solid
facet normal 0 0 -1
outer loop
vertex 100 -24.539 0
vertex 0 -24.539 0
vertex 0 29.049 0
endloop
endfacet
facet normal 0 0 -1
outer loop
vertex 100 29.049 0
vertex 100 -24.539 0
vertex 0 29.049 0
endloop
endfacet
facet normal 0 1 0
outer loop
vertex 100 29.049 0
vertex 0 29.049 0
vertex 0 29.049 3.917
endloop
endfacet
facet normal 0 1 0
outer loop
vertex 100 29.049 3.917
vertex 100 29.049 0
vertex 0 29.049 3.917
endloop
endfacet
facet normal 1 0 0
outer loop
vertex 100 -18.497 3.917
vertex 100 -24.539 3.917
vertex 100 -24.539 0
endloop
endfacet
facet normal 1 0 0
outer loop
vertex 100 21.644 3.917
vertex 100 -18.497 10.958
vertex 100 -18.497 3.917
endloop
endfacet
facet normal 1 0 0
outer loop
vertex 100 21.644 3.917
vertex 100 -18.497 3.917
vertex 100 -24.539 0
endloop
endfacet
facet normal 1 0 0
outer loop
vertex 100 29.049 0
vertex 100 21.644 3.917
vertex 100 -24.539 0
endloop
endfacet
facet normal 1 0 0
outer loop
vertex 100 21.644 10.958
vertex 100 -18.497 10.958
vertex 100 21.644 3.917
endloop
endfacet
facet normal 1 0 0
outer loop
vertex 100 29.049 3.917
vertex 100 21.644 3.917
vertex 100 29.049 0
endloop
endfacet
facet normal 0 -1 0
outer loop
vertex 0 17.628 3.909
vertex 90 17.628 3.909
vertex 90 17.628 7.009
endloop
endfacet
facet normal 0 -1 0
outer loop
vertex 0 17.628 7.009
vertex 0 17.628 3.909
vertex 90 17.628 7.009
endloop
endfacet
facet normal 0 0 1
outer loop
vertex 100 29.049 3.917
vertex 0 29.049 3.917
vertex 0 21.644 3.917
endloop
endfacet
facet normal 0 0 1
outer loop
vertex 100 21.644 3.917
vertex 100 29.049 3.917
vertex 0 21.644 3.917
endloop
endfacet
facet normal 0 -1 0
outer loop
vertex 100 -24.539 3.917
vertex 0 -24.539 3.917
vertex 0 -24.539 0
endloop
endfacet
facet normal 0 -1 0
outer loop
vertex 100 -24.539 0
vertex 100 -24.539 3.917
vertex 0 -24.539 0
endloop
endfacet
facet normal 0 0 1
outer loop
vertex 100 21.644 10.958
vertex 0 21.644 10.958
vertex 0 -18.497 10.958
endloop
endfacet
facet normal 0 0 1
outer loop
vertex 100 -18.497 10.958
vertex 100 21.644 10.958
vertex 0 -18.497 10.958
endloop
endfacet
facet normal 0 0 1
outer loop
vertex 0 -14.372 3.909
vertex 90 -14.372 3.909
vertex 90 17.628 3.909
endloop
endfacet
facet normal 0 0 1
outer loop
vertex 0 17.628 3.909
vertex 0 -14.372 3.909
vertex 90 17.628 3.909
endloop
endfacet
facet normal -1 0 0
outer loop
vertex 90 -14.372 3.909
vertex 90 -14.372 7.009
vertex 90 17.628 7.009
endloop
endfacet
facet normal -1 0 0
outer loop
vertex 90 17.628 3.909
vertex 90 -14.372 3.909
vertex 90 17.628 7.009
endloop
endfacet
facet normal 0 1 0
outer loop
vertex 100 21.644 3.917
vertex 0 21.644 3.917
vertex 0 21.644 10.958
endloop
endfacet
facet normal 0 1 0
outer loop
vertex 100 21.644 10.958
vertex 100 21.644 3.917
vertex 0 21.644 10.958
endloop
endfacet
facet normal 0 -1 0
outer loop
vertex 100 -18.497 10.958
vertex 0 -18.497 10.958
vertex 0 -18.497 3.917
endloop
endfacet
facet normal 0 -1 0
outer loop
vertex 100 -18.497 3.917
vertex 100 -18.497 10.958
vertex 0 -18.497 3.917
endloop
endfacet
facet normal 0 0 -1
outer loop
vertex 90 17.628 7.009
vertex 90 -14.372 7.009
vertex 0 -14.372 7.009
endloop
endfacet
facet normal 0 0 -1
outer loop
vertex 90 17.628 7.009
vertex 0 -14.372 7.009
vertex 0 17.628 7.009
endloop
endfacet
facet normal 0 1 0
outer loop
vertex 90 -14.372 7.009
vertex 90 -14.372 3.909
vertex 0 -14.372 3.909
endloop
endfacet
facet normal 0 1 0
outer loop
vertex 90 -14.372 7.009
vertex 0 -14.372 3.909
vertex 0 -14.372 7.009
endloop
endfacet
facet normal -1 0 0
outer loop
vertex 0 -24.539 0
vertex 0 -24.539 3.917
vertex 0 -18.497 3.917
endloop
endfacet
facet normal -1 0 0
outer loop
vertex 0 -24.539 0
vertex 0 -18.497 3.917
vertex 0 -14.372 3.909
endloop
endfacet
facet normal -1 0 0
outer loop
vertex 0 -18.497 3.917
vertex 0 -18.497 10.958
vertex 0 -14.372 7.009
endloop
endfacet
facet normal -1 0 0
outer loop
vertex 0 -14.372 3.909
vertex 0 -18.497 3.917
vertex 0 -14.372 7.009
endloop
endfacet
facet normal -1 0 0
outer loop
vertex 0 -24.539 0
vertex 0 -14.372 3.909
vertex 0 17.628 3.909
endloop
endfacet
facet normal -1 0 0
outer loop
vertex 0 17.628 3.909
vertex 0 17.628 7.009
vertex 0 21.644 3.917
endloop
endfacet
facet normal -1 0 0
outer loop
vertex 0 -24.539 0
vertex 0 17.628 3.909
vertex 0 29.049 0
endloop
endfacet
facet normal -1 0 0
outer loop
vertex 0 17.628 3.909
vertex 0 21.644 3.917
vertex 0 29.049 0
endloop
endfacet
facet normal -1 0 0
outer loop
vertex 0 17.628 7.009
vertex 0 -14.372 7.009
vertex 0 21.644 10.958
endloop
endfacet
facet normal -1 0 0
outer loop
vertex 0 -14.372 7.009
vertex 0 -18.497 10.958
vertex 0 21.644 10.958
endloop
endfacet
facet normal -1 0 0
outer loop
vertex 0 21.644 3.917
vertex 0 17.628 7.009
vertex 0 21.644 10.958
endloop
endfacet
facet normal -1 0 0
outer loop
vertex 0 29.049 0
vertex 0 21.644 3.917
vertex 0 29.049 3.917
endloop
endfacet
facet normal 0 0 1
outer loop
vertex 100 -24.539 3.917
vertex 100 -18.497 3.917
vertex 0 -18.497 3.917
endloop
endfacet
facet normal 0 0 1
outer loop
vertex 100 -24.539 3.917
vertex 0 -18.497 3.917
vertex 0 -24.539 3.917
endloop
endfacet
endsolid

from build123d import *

# Parameters (mm, degrees)
F0_W     = 32
F0_H     = 3.1
F1_DEPTH = 100
F2_DEPTH = 90


with BuildPart() as f1:
    # F0 (on Right) → F1 (new body)
    with BuildSketch(Plane.YZ):
        Polygon((-24.5385469525, 0), (0, 0), (29.0492966146, 0), (29.0492966146, 3.9169512209), (21.6441504219, 3.9169512209), (21.6441504219, 10.9582875453), (-18.4965940373, 10.9582875453), (-18.4965940373, 3.9169512209), (-24.5385469525, 3.9169512209), align=None)
        with Locations((1.6276613058, 5.4589794578)):
            Rectangle(F0_W, F0_H, mode=Mode.SUBTRACT)
        with Locations((1.6276613058, 5.4589794578)):
            Rectangle(F0_W, F0_H)
    extrude(amount=F1_DEPTH)

    # F0 (on Right) → F2 (cut, through all)
    with BuildSketch(Plane.YZ):
        with Locations((1.6276613058, 5.4589794578)):
            Rectangle(F0_W, F0_H)
    extrude(amount=F2_DEPTH, mode=Mode.SUBTRACT)


solid = f1.part
